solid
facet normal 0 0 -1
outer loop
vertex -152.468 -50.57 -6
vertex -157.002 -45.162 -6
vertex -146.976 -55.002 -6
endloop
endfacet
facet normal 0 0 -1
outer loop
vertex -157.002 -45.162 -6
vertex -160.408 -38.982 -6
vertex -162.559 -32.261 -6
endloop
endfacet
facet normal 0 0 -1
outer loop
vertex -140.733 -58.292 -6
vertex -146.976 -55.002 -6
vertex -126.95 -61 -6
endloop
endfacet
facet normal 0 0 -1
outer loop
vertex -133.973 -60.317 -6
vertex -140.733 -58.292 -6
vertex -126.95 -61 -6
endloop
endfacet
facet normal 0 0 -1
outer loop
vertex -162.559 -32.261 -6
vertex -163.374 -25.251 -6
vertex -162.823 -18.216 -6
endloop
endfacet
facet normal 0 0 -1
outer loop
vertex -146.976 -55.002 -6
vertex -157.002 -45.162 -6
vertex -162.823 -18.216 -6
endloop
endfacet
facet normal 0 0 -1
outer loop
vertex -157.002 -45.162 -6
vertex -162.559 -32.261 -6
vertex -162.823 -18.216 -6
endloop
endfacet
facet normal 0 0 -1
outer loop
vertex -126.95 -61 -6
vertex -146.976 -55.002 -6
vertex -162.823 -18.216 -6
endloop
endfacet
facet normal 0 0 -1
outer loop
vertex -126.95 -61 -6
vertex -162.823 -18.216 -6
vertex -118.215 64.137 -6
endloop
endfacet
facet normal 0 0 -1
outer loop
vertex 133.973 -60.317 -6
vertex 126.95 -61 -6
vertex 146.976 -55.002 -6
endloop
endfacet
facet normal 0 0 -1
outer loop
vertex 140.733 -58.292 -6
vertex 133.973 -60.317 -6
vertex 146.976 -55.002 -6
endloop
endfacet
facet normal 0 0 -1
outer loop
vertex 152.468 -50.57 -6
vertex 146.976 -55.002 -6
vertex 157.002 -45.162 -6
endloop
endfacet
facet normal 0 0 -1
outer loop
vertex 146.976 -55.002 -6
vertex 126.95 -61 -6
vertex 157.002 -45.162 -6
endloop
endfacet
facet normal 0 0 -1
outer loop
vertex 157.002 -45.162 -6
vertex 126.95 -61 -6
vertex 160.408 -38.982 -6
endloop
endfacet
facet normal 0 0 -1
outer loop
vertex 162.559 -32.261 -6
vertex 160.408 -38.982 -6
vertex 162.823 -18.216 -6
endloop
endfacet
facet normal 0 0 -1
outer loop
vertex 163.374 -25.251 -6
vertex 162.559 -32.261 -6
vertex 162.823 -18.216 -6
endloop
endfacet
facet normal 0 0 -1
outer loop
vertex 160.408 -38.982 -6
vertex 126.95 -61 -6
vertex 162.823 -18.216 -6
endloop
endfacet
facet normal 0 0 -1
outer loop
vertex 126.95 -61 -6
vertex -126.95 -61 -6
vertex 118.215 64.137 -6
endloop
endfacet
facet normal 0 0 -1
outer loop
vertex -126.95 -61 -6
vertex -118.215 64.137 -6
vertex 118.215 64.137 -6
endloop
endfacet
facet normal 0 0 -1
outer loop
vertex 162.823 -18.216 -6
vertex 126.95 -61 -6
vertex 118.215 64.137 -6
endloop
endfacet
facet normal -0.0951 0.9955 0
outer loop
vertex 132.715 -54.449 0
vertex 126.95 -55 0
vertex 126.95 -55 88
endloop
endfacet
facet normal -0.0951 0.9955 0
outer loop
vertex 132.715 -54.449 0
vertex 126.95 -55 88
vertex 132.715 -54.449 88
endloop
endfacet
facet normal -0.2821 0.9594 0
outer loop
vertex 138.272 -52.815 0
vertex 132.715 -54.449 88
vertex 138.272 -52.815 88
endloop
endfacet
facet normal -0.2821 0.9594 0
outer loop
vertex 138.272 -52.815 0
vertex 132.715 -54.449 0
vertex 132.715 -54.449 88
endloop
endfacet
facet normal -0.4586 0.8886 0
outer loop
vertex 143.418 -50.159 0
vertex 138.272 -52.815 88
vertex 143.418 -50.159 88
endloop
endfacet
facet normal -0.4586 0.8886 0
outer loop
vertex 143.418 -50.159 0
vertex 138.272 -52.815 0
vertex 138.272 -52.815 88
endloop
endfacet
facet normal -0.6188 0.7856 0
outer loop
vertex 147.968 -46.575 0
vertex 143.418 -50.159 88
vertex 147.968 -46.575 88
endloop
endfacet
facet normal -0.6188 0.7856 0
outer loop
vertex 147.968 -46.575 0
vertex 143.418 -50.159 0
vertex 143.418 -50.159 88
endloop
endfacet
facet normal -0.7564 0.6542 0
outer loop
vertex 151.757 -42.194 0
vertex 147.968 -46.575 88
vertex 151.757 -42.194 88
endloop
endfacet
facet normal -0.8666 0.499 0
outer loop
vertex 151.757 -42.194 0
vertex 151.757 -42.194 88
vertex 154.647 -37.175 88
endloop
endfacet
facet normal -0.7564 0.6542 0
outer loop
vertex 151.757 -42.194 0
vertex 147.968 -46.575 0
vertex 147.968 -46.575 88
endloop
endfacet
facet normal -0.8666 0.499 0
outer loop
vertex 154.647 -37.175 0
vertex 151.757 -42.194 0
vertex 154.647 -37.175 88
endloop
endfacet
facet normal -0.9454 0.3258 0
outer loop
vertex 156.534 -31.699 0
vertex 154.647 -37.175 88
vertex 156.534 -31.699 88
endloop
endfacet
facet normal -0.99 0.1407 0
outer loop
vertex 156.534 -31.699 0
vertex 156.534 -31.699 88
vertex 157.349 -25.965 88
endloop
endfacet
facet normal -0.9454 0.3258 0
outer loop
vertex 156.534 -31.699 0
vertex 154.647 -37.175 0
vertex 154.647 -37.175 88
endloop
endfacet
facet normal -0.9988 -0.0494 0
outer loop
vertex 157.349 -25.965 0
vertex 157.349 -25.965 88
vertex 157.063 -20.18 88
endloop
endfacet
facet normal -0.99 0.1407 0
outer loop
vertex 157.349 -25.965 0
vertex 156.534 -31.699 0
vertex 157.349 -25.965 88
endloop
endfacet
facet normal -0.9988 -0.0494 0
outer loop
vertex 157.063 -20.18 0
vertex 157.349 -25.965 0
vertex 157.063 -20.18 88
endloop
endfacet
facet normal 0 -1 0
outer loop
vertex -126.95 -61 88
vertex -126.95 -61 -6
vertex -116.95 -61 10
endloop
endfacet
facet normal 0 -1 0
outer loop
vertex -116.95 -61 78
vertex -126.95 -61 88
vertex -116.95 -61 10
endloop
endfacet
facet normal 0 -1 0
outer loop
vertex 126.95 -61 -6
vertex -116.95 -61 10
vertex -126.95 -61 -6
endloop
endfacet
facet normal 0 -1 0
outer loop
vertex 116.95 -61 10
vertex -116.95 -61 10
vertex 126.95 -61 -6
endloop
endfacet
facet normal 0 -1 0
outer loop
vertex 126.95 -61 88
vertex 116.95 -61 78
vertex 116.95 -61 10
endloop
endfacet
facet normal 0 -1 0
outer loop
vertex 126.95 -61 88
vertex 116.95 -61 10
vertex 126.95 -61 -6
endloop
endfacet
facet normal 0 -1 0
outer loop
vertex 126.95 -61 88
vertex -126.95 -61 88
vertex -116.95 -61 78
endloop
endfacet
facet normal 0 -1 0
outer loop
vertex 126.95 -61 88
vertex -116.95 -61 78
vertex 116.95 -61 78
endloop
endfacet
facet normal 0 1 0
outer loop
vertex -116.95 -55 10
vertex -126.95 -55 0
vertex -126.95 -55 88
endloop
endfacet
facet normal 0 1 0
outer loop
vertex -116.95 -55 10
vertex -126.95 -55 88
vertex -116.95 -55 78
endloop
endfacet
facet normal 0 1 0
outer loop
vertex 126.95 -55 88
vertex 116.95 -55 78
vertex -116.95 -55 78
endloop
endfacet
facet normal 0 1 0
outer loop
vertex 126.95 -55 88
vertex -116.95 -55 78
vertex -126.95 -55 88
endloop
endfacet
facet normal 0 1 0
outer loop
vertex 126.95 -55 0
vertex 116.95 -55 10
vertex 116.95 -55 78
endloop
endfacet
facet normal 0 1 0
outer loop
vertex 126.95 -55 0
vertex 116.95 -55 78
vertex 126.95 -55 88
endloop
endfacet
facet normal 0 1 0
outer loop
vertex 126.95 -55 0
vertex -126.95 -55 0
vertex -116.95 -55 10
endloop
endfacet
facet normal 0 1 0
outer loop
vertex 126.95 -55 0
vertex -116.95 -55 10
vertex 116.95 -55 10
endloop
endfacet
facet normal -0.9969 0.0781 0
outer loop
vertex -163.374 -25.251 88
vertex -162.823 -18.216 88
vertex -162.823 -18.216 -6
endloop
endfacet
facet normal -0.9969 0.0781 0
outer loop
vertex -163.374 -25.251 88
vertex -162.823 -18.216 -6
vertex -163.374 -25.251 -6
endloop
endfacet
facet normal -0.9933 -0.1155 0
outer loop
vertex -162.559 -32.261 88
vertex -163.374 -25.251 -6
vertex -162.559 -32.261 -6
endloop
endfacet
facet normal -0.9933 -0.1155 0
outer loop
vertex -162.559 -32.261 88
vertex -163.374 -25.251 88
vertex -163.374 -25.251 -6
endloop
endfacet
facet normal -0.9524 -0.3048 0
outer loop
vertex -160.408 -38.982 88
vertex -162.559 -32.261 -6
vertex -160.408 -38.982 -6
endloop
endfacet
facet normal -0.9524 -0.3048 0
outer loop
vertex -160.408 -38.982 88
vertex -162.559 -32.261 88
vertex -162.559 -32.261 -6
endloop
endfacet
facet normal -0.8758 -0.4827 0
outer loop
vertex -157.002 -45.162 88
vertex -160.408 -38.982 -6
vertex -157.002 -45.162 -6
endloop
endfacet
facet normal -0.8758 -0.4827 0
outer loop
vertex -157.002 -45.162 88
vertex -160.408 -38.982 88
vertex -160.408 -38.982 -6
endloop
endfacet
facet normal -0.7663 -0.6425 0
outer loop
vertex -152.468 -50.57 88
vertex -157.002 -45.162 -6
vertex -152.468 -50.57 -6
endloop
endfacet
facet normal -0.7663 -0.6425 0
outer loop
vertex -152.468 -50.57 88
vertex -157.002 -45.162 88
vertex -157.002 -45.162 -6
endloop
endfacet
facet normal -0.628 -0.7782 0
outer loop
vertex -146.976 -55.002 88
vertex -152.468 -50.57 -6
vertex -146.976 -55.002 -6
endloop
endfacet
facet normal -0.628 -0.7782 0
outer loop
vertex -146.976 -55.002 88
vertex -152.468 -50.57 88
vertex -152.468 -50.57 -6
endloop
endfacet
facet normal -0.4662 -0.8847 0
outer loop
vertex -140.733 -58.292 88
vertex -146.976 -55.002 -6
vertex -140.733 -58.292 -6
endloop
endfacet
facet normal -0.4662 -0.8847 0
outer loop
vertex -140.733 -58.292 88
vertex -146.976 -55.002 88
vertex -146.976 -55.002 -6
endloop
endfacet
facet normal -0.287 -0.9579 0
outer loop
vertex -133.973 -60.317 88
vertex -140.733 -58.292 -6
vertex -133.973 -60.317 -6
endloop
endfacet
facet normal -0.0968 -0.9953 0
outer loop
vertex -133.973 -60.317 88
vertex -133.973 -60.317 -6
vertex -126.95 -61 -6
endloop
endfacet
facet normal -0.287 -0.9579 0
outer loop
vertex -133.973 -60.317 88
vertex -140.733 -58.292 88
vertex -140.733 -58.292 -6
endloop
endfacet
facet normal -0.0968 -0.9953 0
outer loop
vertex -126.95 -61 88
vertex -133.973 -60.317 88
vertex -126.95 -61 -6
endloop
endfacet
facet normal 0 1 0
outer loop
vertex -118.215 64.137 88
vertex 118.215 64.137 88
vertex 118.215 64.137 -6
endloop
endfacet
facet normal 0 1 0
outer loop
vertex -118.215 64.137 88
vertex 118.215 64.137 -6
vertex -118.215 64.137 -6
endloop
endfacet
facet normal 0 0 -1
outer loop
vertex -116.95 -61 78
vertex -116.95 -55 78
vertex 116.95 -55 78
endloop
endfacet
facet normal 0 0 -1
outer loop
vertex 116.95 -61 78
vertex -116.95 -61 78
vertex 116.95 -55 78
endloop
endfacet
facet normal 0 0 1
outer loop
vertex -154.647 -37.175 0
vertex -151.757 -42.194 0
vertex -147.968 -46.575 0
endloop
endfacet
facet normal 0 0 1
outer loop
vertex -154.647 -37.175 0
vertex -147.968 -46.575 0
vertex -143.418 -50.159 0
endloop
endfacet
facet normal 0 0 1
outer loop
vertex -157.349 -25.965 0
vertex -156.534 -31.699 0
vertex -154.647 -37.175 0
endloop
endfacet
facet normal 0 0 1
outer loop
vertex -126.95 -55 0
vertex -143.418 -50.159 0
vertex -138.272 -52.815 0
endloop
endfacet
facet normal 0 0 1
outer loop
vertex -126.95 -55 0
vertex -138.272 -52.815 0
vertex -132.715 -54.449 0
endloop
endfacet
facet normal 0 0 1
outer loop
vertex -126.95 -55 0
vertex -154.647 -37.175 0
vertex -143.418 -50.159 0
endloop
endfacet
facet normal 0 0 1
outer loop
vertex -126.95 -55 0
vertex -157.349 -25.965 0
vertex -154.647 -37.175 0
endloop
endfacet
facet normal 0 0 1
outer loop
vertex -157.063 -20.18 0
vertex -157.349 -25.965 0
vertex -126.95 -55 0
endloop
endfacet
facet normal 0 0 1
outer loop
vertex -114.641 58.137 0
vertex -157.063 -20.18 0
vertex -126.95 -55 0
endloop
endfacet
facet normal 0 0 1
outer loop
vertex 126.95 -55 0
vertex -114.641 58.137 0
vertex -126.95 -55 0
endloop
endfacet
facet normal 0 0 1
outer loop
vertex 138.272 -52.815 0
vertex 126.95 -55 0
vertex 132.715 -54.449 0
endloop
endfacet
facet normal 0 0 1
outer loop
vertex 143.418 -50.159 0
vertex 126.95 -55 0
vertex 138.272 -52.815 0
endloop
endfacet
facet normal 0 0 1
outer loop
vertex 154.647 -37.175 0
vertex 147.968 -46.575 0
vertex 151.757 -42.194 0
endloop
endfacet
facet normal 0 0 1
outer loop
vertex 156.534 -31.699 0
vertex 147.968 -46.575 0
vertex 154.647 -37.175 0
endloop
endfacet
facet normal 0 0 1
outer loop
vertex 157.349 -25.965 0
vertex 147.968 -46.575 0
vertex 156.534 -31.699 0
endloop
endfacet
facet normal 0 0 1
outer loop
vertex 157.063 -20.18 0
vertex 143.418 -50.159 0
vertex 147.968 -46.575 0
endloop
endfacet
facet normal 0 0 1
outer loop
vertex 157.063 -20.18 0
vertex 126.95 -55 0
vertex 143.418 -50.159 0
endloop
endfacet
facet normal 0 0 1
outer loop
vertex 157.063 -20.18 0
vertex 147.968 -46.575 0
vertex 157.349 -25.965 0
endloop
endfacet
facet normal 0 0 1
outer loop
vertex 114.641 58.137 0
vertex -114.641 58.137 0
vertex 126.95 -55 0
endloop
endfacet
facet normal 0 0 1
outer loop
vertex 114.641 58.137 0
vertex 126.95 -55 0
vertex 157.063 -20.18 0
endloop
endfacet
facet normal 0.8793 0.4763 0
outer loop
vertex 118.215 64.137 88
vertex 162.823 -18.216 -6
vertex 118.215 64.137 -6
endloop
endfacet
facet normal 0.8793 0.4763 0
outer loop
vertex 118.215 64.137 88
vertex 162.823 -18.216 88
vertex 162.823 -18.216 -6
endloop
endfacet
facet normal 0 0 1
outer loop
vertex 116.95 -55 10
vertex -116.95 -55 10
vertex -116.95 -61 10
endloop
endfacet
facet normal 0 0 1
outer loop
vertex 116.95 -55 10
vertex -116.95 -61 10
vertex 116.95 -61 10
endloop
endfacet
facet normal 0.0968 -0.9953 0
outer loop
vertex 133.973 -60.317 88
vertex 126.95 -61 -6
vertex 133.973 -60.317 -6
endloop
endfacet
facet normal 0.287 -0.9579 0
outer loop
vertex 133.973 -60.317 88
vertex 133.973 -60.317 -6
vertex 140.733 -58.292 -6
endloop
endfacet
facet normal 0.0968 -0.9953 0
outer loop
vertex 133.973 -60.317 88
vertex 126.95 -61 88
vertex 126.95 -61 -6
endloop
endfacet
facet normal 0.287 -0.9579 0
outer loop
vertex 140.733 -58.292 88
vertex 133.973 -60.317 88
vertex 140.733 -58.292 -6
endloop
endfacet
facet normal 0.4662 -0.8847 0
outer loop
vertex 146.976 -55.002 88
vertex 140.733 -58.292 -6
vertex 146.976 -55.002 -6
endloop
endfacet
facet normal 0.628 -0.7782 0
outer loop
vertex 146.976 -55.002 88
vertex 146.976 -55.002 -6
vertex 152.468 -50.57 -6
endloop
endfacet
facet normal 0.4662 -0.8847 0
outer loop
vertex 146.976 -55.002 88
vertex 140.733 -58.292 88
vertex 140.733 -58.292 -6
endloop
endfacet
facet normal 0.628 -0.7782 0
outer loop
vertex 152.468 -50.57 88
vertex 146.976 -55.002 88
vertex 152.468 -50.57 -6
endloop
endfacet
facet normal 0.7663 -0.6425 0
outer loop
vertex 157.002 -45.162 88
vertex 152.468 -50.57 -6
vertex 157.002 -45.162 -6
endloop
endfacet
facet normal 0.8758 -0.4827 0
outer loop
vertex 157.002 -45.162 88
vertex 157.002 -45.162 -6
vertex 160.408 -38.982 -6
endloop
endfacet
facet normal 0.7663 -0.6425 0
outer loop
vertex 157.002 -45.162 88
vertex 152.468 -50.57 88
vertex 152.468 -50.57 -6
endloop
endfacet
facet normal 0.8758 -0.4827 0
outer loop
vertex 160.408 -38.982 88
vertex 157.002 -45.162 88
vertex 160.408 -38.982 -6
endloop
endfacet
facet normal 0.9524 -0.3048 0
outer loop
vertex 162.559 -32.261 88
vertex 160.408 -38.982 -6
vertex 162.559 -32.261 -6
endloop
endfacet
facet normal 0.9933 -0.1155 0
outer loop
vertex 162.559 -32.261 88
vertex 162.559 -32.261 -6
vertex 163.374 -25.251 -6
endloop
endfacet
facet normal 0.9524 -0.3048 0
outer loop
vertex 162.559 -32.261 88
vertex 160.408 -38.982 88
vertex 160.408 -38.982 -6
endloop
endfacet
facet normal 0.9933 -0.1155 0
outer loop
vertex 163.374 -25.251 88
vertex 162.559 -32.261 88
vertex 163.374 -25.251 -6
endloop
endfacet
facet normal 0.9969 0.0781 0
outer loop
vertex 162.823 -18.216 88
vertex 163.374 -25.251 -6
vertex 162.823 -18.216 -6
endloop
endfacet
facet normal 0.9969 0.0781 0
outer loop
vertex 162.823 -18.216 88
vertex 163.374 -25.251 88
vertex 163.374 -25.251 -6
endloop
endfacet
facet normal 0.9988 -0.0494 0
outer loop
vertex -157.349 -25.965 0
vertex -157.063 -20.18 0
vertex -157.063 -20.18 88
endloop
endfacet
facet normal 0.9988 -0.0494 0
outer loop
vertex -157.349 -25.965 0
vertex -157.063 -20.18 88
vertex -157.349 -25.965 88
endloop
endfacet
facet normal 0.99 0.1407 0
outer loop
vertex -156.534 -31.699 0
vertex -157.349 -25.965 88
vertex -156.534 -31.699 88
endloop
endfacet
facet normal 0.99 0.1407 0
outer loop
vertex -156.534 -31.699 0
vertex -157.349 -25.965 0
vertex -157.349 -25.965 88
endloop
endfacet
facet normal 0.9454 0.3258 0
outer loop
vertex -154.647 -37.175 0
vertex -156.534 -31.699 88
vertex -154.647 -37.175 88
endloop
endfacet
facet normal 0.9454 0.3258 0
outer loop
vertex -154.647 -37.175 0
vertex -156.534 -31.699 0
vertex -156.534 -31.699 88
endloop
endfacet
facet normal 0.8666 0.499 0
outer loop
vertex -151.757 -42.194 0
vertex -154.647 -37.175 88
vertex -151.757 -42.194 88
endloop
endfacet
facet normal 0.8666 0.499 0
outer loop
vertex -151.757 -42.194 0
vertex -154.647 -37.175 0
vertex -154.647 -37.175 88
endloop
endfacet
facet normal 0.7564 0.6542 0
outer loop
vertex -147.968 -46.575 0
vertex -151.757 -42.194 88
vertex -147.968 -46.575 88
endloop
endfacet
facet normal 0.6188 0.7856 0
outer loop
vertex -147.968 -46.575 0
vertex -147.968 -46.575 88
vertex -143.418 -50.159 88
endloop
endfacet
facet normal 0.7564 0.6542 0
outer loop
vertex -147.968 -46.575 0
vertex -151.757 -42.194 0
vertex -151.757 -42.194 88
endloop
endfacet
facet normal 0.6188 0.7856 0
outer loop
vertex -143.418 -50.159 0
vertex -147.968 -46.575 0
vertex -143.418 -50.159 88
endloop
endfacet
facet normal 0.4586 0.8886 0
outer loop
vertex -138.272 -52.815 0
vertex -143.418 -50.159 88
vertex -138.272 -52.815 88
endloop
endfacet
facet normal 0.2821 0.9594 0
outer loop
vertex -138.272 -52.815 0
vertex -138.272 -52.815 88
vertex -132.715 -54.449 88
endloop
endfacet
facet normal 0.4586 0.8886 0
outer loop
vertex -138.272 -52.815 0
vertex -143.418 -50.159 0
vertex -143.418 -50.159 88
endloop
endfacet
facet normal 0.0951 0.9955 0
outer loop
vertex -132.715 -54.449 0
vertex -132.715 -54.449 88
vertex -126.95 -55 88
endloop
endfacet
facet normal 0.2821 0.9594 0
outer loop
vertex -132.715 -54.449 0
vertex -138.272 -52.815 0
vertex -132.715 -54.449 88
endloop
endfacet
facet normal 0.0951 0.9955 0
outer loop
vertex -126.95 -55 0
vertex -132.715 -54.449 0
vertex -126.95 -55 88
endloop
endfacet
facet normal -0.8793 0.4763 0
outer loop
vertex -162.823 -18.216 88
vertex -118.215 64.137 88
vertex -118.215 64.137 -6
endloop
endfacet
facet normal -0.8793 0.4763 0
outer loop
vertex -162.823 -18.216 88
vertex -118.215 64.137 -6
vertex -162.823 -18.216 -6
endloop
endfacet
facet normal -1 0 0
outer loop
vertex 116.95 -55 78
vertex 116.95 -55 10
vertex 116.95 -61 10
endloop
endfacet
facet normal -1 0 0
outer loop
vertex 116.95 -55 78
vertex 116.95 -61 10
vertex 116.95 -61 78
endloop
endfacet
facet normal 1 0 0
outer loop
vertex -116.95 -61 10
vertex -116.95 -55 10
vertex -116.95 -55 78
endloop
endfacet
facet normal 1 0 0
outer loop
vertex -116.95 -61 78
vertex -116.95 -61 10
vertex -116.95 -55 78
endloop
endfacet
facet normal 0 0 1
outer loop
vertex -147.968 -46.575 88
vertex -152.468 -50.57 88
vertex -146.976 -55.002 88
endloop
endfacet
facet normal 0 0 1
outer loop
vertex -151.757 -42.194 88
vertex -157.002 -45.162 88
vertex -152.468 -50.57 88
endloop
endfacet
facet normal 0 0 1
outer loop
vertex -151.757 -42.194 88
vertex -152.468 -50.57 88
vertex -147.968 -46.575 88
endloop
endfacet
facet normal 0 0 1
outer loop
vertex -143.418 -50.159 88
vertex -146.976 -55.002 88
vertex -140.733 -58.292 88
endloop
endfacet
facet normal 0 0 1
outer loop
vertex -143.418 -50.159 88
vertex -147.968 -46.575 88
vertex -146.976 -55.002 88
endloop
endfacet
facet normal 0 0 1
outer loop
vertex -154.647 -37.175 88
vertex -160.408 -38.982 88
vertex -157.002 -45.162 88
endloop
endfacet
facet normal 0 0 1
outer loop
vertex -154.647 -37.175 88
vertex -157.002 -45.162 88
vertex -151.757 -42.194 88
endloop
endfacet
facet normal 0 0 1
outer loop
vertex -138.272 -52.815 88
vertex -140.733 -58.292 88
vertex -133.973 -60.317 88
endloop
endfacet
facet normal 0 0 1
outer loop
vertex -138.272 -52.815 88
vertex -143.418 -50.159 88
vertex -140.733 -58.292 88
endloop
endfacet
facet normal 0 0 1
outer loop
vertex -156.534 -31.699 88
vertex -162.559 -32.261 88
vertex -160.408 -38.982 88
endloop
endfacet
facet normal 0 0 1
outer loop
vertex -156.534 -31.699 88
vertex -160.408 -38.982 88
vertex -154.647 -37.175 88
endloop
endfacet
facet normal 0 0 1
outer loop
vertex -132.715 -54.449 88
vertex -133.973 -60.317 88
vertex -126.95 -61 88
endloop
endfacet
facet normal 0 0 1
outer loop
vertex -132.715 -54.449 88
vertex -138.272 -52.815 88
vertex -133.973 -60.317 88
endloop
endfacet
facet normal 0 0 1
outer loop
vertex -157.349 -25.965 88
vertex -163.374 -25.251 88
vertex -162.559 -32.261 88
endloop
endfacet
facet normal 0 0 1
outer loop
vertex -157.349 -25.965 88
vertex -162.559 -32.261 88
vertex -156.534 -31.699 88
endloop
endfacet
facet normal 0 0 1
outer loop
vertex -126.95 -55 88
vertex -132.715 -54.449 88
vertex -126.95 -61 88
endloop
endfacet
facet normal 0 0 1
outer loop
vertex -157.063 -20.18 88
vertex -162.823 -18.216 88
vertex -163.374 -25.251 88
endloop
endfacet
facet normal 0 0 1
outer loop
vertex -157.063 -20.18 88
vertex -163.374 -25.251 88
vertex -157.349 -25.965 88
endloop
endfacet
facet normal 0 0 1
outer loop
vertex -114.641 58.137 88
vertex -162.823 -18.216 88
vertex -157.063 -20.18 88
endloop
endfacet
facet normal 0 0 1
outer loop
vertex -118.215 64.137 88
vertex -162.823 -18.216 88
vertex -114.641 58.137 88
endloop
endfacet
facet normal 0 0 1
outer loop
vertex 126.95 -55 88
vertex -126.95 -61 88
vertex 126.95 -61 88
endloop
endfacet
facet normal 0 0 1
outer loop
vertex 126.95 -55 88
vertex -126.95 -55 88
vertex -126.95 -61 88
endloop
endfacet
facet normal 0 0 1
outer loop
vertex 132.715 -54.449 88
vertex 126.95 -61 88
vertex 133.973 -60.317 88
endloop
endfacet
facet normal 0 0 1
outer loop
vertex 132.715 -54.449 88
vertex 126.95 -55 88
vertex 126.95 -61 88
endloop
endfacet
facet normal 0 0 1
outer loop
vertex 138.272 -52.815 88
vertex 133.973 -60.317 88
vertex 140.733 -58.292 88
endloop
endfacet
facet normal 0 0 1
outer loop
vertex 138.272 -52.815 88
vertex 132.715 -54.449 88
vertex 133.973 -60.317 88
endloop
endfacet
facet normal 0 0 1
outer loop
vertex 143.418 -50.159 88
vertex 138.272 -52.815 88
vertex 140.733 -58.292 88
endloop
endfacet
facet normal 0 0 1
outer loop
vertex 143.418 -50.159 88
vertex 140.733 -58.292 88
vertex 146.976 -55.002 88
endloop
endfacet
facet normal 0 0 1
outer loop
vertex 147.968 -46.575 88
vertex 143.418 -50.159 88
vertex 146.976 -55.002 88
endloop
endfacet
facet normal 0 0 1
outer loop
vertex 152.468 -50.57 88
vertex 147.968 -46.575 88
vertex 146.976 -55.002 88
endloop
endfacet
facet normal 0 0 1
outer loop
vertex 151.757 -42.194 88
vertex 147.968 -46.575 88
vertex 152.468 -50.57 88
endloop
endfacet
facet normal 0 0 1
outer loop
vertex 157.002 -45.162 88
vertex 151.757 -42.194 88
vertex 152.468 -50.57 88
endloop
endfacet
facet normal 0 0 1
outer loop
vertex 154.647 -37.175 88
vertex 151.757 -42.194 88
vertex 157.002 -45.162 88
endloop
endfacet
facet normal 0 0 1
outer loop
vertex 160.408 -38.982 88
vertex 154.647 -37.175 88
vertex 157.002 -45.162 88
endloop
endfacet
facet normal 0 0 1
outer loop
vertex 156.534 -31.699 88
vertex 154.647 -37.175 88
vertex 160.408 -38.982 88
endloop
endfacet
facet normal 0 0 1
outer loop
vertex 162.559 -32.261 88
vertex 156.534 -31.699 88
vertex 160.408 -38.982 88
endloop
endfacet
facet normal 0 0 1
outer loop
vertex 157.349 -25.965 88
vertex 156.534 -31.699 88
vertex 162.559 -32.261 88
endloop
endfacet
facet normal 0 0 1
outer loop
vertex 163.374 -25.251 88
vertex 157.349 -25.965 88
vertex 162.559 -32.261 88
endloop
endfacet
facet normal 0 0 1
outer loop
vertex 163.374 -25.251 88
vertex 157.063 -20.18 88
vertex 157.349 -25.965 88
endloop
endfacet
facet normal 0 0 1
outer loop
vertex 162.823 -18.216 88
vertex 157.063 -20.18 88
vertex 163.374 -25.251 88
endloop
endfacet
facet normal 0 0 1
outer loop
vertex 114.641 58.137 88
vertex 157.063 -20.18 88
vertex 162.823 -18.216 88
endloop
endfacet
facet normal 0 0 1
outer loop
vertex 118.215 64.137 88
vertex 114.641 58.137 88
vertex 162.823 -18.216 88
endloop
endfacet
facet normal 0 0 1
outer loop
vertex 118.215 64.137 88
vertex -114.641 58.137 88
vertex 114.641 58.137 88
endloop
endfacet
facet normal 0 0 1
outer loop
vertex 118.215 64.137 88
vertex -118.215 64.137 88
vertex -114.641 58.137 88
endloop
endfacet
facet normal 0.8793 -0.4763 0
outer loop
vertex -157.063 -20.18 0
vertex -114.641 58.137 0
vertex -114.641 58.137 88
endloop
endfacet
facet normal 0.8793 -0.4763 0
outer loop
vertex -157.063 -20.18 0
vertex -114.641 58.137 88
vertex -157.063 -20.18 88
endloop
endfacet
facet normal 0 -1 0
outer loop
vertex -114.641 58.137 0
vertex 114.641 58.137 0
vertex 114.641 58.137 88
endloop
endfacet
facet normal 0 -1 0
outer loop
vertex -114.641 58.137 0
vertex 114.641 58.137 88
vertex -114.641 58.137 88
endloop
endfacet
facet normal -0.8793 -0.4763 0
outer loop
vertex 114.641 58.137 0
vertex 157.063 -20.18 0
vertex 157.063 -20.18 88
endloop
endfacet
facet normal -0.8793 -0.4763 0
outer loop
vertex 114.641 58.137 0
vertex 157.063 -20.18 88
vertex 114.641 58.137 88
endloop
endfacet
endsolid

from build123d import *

# Parameters (mm, degrees)
BOSS_EXTRUDE1_DEPTH = 88
SKETCH3_W           = 233.89900304
SKETCH3_H           = 68
CUT_EXTRUDE1_DEPTH  = 15
BOSS_EXTRUDE2_DEPTH = 6


with BuildPart() as part:
    # Sketch1 → Boss-Extrude1 (new body)
    with BuildSketch(Plane.XY):
        with BuildLine():
            Line((118.214818276, 64.136748505), (-118.214818276, 64.136748505))
            Line((-118.214818276, 64.136748505), (-162.822637659, -18.216148816))
            ThreePointArc((-162.822637659, -18.216148816), (-154.866072847, -47.976045164), (-126.94950152, -61))
            Line((-126.94950152, -61), (126.94950152, -61))
            ThreePointArc((126.94950152, -61), (154.866072847, -47.976045164), (162.822637659, -18.216148816))
            Line((162.822637659, -18.216148816), (118.214818276, 64.136748505))
        make_face()
        with BuildLine():
            Line((114.641146244, 58.136748505), (-114.641146244, 58.136748505))
            Line((-114.641146244, 58.136748505), (-157.062609578, -20.179799188))
            ThreePointArc((-157.062609578, -20.179799188), (-149.967134226, -44.474777247), (-126.94950152, -55))
            Line((-126.94950152, -55), (126.94950152, -55))
            ThreePointArc((126.94950152, -55), (149.967134226, -44.474777247), (157.062609578, -20.179799188))
            Line((157.062609578, -20.179799188), (114.641146244, 58.136748505))
        make_face(mode=Mode.SUBTRACT)
    extrude(amount=BOSS_EXTRUDE1_DEPTH)

    # Sketch3 → Cut-Extrude1 (cut)
    with BuildSketch(Plane.XZ.offset(46)):
        with Locations((0, 44)):
            Rectangle(SKETCH3_W, SKETCH3_H)
    extrude(amount=CUT_EXTRUDE1_DEPTH, mode=Mode.SUBTRACT)

    # Sketch1<12> → Boss-Extrude2 (add)
    with BuildSketch(Plane.XY):
        with BuildLine():
            Line((162.822637659, -18.216148816), (118.214818276, 64.136748505))
            Line((118.214818276, 64.136748505), (-118.214818276, 64.136748505))
            Line((-118.214818276, 64.136748505), (-162.822637659, -18.216148816))
            ThreePointArc((-162.822637659, -18.216148816), (-154.866072847, -47.976045164), (-126.94950152, -61))
            Line((-126.94950152, -61), (126.94950152, -61))
            ThreePointArc((126.94950152, -61), (154.866072847, -47.976045164), (162.822637659, -18.216148816))
        make_face()
    extrude(amount=-BOSS_EXTRUDE2_DEPTH)


solid = part.part
